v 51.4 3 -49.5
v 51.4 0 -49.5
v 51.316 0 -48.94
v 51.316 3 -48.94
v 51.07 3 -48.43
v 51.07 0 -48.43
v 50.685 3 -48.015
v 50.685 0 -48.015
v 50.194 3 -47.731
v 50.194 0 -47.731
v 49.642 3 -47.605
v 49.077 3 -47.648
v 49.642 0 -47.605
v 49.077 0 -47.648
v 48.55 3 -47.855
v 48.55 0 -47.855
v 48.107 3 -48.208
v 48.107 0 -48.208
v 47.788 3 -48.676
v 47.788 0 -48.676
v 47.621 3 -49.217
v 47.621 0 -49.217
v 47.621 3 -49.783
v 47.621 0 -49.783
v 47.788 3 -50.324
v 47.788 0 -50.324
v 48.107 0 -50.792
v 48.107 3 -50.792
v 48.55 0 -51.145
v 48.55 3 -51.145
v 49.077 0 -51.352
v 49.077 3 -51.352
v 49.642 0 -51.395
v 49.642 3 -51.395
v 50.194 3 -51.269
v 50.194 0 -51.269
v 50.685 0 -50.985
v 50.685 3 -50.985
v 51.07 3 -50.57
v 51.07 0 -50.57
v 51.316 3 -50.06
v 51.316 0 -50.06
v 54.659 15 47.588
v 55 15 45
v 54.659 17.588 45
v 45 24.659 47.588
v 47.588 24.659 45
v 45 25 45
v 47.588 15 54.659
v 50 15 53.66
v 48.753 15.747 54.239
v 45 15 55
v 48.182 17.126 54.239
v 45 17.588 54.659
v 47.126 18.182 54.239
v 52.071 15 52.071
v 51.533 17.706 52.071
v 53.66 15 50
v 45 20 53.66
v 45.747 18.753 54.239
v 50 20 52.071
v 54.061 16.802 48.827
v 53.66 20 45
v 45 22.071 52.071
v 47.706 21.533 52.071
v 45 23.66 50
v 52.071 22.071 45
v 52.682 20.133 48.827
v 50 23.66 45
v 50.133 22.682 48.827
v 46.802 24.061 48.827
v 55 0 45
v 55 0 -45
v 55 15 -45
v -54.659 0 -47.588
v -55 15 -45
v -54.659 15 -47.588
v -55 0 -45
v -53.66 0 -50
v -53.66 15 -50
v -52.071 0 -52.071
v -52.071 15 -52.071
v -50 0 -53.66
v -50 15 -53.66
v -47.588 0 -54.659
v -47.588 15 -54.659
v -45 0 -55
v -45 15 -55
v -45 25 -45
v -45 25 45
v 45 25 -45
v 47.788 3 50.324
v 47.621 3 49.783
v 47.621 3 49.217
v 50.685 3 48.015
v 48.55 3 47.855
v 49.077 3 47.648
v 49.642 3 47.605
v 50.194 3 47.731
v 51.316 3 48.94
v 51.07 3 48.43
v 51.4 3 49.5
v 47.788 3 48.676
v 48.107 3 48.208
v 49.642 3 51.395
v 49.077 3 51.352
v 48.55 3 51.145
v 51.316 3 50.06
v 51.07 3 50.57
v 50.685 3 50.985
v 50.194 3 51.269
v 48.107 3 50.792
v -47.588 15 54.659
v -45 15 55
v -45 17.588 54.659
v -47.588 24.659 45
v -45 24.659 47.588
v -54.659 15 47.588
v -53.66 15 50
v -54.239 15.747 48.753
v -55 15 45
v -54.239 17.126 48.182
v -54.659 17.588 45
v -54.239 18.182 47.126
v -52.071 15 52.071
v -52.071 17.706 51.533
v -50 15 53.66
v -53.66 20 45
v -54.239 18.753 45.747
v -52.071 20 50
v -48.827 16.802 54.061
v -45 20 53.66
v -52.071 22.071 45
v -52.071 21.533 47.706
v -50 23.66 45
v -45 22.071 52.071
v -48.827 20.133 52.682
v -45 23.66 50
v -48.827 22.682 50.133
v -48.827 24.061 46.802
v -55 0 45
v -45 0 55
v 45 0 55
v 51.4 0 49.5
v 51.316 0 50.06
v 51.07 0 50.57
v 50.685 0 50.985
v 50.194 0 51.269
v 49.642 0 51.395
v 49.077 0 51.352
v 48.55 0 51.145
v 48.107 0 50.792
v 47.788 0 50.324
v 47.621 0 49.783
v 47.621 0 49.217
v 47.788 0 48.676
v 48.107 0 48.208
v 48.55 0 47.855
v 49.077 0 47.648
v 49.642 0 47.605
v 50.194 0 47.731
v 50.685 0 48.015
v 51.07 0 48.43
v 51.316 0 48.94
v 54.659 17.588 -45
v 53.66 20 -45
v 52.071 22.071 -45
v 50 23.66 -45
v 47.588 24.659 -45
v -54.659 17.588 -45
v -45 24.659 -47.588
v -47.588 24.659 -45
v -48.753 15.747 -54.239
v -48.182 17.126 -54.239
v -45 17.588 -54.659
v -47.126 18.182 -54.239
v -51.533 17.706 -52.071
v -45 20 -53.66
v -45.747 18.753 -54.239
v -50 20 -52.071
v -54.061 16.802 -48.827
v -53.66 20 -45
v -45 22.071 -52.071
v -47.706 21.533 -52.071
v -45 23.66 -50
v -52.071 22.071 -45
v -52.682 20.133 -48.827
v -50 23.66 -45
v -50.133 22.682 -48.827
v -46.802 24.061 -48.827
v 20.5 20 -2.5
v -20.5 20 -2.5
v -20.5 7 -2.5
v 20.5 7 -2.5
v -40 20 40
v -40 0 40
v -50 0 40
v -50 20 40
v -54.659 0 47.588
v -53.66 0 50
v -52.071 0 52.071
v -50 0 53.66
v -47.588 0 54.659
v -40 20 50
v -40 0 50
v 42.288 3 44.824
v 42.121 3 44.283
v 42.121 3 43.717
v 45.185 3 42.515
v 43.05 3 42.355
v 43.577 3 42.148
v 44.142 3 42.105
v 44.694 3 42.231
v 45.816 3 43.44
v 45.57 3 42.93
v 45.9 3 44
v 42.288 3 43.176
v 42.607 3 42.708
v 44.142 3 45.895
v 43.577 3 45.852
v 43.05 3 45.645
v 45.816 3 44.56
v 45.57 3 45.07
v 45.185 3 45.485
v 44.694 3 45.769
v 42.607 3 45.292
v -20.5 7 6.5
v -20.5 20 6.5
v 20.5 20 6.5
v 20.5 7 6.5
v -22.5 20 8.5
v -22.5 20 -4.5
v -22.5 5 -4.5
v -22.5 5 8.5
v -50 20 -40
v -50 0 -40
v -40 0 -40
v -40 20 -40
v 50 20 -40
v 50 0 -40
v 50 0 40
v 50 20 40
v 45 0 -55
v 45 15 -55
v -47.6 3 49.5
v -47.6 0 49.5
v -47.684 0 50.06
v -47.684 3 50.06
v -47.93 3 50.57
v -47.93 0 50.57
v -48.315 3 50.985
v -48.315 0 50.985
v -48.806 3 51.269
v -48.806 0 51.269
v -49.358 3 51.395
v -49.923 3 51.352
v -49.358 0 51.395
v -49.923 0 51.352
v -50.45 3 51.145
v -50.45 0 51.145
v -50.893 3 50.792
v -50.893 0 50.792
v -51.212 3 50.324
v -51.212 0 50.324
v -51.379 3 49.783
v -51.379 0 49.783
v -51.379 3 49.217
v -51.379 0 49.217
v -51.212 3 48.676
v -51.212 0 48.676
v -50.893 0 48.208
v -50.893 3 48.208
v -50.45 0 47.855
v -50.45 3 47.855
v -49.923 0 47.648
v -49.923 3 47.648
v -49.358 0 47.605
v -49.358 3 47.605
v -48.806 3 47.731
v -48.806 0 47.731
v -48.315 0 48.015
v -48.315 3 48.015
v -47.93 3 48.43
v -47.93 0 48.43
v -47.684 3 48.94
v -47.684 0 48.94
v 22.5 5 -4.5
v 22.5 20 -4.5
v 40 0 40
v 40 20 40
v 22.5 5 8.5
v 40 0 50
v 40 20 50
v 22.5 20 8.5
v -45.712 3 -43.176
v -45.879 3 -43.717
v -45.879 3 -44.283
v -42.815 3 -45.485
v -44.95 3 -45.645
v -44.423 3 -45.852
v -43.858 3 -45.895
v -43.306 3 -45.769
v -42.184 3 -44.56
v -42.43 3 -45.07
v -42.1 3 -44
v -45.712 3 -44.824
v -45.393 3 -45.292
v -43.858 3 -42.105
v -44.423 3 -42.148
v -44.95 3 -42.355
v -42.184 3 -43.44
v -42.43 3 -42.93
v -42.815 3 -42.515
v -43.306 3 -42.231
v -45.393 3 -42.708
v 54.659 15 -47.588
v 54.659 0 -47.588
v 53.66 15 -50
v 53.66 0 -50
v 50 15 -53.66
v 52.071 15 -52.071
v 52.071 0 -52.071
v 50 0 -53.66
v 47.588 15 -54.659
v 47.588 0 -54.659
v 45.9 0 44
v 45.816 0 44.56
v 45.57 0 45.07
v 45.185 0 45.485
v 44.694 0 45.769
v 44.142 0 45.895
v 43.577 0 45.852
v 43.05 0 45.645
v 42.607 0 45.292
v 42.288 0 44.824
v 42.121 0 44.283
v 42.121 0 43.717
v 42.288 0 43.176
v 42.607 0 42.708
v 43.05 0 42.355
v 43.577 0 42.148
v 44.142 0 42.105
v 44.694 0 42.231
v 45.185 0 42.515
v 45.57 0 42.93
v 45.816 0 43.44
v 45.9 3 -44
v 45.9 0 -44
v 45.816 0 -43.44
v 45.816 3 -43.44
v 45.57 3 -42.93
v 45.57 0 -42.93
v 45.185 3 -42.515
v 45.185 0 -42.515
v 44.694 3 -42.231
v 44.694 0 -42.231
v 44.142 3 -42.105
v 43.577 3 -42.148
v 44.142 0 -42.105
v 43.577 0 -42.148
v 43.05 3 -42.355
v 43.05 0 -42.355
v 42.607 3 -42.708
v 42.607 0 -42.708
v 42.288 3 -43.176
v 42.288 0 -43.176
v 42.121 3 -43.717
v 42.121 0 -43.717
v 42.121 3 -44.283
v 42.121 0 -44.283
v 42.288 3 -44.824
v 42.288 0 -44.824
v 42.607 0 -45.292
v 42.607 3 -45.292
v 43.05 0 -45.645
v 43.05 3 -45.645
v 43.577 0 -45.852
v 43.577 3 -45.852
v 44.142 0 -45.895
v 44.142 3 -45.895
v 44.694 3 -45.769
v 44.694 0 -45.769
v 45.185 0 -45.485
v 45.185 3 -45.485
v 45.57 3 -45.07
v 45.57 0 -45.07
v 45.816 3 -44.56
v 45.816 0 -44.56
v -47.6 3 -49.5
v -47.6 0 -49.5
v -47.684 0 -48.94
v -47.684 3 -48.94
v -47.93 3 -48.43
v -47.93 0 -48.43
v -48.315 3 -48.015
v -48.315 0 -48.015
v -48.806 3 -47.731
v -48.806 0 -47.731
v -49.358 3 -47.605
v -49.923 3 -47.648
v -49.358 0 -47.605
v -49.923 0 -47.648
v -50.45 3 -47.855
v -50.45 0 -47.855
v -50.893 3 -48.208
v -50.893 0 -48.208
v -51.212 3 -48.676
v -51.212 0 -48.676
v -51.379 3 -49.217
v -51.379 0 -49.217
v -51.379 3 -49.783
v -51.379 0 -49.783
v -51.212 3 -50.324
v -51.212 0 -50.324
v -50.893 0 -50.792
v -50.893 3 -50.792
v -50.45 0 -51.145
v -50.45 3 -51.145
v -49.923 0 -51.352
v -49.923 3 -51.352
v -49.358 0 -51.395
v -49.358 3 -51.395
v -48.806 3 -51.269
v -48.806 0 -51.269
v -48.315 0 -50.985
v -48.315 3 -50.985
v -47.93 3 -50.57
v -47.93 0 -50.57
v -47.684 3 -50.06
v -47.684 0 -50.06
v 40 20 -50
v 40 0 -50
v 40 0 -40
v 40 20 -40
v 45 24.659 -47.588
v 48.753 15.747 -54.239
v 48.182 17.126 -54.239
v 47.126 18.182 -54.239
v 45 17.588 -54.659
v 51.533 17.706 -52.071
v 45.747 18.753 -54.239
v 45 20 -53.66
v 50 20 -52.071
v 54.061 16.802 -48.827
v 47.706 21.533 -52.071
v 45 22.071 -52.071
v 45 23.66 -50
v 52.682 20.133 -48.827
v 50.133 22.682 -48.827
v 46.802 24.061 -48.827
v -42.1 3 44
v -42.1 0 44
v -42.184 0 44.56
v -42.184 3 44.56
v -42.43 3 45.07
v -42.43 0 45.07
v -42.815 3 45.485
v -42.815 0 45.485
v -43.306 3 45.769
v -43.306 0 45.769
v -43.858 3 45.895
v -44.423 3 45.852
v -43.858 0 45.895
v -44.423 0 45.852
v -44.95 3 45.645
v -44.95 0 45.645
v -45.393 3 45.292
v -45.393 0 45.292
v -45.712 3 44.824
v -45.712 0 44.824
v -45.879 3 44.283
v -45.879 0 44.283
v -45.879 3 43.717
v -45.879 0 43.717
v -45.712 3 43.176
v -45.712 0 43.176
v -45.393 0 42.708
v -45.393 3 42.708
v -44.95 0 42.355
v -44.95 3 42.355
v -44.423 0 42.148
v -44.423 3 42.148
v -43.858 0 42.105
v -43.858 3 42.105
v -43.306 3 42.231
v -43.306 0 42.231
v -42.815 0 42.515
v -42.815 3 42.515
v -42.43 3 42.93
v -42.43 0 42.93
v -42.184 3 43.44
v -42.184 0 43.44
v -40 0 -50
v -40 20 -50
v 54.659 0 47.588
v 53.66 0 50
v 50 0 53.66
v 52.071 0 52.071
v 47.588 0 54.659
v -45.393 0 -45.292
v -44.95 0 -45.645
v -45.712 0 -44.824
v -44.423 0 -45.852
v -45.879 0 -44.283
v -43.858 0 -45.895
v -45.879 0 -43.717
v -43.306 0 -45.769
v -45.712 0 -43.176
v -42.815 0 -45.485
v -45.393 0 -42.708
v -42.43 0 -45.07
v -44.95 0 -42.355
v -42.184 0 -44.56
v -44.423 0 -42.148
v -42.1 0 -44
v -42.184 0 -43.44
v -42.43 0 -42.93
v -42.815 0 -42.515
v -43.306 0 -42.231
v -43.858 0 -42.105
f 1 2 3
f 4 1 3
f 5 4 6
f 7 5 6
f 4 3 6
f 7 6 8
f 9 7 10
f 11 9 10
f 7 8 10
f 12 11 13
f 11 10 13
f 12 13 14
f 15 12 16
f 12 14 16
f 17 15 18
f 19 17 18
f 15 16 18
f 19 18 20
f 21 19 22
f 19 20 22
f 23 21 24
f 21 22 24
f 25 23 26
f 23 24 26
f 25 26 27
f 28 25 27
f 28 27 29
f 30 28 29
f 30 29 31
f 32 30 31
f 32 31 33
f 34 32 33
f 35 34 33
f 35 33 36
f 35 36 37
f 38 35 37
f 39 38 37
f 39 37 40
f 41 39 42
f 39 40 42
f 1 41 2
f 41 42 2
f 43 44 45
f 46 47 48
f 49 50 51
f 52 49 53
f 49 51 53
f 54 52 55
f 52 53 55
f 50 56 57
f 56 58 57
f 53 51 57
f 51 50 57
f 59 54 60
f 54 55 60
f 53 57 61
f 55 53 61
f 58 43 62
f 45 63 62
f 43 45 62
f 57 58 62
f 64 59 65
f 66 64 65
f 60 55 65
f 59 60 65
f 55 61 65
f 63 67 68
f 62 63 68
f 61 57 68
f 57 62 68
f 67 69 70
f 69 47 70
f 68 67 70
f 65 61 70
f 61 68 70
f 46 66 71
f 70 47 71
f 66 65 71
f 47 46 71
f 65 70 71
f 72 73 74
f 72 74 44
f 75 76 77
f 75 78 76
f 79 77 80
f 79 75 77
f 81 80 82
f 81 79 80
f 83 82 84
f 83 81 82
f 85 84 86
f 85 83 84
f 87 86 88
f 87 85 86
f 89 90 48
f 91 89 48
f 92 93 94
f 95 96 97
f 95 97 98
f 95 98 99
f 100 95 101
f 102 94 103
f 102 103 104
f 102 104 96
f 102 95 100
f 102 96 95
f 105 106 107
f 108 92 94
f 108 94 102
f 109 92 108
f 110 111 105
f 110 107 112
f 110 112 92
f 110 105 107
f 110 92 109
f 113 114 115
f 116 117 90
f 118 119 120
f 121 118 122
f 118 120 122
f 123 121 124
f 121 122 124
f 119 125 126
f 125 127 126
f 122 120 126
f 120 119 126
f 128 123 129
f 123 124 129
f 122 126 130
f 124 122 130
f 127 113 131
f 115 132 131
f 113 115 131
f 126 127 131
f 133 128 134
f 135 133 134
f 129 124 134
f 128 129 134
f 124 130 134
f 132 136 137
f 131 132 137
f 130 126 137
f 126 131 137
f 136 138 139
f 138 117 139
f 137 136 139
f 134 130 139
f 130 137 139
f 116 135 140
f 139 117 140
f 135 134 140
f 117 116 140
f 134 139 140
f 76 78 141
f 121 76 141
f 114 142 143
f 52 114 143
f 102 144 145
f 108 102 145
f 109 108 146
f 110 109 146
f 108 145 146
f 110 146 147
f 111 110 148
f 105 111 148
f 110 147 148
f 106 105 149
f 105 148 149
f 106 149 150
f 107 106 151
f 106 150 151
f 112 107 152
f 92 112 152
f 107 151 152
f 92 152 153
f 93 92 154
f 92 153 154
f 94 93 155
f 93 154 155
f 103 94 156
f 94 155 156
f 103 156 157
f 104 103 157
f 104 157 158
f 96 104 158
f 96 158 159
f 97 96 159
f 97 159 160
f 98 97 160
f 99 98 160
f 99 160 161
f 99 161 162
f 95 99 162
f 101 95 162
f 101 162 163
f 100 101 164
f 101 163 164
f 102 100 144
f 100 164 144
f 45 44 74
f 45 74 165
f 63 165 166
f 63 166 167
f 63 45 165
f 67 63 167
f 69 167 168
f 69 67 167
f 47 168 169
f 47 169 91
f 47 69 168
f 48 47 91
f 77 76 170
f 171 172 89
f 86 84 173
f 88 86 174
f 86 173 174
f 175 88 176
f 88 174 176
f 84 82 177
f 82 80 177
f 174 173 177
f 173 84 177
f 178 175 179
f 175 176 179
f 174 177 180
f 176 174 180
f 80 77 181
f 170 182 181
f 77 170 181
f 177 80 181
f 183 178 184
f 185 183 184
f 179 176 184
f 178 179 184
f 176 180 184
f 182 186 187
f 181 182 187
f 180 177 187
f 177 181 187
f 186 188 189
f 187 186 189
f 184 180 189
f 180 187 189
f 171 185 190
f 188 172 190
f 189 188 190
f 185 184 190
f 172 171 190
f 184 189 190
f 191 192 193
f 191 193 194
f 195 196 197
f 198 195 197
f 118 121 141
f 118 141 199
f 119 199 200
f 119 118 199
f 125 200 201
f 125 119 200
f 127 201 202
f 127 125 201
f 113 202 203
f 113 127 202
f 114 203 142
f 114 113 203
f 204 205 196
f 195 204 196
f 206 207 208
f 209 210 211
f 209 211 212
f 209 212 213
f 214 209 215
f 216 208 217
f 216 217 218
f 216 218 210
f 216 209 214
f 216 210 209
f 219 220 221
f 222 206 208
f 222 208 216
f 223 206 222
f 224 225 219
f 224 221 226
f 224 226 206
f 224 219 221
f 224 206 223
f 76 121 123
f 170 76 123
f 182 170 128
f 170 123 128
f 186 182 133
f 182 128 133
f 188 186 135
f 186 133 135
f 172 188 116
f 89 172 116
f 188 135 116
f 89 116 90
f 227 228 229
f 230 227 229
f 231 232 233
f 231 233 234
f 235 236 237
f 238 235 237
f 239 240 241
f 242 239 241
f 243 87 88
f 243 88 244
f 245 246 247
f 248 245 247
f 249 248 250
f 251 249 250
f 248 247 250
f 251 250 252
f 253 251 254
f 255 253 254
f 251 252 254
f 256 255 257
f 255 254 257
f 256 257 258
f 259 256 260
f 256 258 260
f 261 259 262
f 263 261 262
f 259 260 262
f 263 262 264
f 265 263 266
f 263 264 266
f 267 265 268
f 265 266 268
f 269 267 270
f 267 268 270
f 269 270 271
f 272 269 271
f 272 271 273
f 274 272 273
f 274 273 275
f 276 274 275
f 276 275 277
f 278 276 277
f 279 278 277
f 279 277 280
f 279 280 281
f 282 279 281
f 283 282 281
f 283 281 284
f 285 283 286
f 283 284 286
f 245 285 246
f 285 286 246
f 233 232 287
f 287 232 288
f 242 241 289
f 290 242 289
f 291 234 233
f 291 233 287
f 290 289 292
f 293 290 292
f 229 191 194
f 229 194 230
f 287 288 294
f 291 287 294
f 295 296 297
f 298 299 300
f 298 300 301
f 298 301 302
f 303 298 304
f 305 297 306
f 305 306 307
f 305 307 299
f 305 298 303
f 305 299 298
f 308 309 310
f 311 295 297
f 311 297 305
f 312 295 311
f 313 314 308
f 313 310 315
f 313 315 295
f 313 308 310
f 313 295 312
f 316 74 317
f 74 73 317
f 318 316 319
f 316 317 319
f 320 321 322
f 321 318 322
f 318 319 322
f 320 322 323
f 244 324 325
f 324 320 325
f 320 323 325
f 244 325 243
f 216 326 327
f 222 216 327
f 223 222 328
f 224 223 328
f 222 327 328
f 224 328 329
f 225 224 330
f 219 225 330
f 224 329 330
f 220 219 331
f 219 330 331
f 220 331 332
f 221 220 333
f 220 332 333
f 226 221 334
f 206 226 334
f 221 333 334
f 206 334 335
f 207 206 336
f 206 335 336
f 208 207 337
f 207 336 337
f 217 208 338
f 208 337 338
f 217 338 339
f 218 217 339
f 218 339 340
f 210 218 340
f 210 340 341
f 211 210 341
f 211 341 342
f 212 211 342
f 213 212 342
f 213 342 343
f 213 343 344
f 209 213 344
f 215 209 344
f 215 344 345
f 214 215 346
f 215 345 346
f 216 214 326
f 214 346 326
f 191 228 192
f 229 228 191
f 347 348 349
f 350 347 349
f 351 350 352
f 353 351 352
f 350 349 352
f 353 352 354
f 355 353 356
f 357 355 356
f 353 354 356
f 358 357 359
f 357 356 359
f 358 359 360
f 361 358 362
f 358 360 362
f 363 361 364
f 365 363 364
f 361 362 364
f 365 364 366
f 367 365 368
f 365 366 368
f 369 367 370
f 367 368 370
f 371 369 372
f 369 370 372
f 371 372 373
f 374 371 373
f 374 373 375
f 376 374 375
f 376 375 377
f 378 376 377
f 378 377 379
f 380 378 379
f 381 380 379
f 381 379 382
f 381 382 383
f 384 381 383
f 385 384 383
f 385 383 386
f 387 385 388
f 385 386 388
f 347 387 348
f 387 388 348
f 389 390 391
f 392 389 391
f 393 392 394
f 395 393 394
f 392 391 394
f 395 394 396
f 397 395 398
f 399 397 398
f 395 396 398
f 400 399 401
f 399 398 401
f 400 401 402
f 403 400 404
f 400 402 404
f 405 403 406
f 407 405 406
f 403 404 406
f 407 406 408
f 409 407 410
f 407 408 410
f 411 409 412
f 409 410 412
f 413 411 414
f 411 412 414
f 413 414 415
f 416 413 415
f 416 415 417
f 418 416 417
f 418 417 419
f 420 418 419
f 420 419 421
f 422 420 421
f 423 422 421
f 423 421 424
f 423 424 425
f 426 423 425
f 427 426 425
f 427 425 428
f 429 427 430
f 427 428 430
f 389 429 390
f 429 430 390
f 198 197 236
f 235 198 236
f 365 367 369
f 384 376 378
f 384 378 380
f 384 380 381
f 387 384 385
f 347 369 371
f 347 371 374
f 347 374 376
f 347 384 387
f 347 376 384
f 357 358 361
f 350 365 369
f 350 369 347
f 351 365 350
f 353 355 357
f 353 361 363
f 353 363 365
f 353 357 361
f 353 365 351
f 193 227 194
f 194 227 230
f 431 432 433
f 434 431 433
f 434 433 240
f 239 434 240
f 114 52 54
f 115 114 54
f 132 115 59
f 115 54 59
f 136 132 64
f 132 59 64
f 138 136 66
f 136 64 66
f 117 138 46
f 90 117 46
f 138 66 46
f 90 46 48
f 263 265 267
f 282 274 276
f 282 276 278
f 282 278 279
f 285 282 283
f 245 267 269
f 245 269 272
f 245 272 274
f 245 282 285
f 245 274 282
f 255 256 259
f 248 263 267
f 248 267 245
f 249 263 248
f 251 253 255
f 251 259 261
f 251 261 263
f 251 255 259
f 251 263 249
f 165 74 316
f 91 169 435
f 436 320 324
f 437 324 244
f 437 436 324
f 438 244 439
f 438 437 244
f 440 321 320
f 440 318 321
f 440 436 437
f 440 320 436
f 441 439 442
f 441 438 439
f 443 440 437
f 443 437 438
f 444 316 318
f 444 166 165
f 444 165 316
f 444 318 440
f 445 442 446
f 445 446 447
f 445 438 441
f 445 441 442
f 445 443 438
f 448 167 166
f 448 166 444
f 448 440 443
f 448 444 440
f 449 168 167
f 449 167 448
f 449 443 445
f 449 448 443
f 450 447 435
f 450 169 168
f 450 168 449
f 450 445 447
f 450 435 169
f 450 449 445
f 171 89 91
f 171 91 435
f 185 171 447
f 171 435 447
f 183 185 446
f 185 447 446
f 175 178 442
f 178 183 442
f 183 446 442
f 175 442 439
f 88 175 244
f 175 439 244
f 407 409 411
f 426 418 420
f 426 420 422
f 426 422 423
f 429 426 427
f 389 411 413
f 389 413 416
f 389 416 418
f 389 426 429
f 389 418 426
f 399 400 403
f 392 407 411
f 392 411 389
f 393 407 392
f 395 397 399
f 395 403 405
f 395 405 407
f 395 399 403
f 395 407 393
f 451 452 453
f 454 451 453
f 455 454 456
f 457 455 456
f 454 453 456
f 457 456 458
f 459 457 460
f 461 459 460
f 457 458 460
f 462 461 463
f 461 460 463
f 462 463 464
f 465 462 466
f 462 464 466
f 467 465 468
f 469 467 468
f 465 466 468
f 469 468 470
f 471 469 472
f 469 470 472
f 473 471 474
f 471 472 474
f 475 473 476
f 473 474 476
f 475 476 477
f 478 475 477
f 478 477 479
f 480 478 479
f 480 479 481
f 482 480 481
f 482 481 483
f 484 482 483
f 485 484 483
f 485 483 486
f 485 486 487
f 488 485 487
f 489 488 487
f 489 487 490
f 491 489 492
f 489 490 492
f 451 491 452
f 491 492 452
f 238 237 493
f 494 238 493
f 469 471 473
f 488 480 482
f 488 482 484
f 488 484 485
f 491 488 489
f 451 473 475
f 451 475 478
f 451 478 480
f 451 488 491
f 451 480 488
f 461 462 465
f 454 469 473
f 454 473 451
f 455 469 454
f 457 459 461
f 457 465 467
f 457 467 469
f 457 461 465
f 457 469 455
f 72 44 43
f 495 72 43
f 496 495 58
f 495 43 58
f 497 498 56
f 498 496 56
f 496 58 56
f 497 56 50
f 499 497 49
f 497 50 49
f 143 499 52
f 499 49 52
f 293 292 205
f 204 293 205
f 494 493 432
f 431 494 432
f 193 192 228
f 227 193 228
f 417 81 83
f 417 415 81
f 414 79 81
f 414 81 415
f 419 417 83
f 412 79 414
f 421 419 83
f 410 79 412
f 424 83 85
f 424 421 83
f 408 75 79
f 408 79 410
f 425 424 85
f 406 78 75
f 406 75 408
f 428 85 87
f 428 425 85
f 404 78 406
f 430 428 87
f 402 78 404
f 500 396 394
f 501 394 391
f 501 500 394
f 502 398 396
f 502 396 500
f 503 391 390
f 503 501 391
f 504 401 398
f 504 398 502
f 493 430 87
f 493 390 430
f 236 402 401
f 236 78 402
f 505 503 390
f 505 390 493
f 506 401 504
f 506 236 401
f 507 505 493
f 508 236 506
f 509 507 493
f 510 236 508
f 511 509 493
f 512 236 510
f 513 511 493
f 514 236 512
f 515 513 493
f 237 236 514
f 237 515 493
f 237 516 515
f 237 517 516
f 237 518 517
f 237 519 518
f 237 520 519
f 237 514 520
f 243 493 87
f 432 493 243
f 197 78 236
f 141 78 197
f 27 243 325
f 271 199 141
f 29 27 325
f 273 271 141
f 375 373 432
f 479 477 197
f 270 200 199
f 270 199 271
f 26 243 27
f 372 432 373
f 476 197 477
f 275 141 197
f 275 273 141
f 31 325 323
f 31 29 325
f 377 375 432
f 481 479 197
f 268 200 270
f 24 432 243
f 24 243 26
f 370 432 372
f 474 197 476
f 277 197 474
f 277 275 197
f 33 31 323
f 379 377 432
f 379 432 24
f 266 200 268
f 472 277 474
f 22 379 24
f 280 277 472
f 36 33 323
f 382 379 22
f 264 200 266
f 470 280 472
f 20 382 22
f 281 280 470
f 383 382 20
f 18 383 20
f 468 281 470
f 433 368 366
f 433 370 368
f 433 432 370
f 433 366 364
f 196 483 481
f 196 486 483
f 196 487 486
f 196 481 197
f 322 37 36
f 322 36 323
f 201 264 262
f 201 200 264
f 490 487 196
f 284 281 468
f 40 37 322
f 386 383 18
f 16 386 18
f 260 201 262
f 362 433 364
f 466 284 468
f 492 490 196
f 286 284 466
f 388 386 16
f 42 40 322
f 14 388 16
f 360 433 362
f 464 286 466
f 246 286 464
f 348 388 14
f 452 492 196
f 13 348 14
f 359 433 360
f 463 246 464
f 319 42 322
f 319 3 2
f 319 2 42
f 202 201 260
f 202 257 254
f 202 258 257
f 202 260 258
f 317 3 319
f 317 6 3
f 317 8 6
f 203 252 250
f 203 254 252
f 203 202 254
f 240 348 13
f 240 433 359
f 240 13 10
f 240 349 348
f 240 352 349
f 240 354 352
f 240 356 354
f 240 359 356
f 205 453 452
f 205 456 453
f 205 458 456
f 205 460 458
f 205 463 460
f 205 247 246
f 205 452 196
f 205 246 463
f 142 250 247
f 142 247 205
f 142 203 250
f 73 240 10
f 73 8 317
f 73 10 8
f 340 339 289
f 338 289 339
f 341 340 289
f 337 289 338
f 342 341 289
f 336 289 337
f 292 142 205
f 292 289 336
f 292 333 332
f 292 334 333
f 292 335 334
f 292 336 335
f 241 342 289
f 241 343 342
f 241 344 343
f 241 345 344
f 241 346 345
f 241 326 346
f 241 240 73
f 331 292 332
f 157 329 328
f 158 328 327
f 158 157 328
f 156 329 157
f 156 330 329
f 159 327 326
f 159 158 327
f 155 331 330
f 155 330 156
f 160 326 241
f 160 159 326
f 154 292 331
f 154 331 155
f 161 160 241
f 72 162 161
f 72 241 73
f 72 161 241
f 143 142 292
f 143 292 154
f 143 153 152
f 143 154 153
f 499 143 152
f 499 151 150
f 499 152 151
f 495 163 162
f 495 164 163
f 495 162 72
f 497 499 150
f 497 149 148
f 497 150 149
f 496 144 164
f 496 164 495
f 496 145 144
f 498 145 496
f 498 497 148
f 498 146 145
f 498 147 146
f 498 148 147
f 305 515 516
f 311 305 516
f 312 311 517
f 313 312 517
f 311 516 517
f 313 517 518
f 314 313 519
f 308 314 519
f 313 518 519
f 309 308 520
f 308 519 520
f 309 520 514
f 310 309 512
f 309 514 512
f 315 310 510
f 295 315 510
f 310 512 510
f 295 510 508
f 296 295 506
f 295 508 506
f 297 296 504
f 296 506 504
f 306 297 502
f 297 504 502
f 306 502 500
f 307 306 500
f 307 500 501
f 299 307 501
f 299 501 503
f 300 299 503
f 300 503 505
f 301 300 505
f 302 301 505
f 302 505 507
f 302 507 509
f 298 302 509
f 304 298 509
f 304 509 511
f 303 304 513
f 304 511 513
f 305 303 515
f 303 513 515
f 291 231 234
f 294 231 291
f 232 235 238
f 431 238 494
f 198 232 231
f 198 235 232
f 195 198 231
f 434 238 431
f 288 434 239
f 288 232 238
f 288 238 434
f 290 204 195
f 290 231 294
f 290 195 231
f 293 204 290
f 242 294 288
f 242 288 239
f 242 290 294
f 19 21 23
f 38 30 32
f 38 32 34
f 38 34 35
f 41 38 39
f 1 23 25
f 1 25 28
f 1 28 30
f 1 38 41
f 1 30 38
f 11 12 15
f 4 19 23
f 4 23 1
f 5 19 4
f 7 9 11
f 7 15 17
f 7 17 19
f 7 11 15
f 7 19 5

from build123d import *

# Parameters (mm, degrees)
F0_W      = 110
F0_H      = 110
F1_DEPTH  = 25
F2_R      = 10
F3_W      = 110
F3_H      = 110
F4_DEPTH  = 26
F6_DEPTH  = 20
F7_W      = 45
F7_H      = 13
F7_W_2    = 41
F7_H_2    = 9
F8_DEPTH  = 15
F9_W      = 45
F9_H      = 13
F10_DEPTH = 2
F11_R     = 1.9
F12_DEPTH = 3


with BuildPart() as f1:
    # F0 (on Front) → F1 (new body, symmetric)
    with BuildSketch(Plane.XZ):
        Rectangle(F0_W, F0_H)
    extrude(amount=F1_DEPTH, both=True)

    # F2
    f2_edges = [f1.edges().sort_by_distance(p)[0] for p in [
        (0, -25, 55),
        (-55, -25, 0),
        (0, -25, -55),
        (55, -25, 0),
        (55, 25, 0),
        (55, 0, 55),
        (55, 0, -55),
        (0, 25, 55),
        (-55, 0, 55),
        (-55, 25, 0),
        (-55, 0, -55),
        (0, 25, -55),
    ]]
    fillet(f2_edges, radius=F2_R)

    # F3 (on Front) → F4 (cut)
    with BuildSketch(Plane.XZ):
        Rectangle(F3_W, F3_H)
    extrude(amount=F4_DEPTH, mode=Mode.SUBTRACT)

    # F5 (on Front) → F6 (cut)
    with BuildSketch(Plane.XZ):
        Polygon((40, 40), (40, 50), (-40, 50), (-40, 40), (-50, 40), (-50, -40), (-40, -40), (-40, -50), (40, -50), (40, -40), (50, -40), (50, 40), align=None)
    extrude(amount=-F6_DEPTH, mode=Mode.SUBTRACT)

    # F7 (on face) → F8 (join)
    with BuildSketch(Plane.XZ.offset(-20)):
        with Locations((0, 2)):
            Rectangle(F7_W, F7_H)
        with Locations((0, 2)):
            Rectangle(F7_W_2, F7_H_2, mode=Mode.SUBTRACT)
    extrude(amount=F8_DEPTH)

    # F9 (on face) → F10 (join)
    with BuildSketch(Plane.XZ.offset(-5)):
        with Locations((0, 2)):
            Rectangle(F9_W, F9_H)
    extrude(amount=-F10_DEPTH)

    # F11 (on face) → F12 (cut)
    with BuildSketch(Plane.XZ):
        with Locations((49.5, 49.5)):
            Circle(F11_R)
        with Locations((44, 44)):
            Circle(F11_R)
        with Locations((-44, 44)):
            Circle(F11_R)
        with Locations((-49.5, 49.5)):
            Circle(F11_R)
        with Locations((-44, -44)):
            Circle(F11_R)
        with Locations((-49.5, -49.5)):
            Circle(F11_R)
        with Locations((44, -44)):
            Circle(F11_R)
        with Locations((49.5, -49.5)):
            Circle(F11_R)
    extrude(amount=-F12_DEPTH, mode=Mode.SUBTRACT)


solid = f1.part
